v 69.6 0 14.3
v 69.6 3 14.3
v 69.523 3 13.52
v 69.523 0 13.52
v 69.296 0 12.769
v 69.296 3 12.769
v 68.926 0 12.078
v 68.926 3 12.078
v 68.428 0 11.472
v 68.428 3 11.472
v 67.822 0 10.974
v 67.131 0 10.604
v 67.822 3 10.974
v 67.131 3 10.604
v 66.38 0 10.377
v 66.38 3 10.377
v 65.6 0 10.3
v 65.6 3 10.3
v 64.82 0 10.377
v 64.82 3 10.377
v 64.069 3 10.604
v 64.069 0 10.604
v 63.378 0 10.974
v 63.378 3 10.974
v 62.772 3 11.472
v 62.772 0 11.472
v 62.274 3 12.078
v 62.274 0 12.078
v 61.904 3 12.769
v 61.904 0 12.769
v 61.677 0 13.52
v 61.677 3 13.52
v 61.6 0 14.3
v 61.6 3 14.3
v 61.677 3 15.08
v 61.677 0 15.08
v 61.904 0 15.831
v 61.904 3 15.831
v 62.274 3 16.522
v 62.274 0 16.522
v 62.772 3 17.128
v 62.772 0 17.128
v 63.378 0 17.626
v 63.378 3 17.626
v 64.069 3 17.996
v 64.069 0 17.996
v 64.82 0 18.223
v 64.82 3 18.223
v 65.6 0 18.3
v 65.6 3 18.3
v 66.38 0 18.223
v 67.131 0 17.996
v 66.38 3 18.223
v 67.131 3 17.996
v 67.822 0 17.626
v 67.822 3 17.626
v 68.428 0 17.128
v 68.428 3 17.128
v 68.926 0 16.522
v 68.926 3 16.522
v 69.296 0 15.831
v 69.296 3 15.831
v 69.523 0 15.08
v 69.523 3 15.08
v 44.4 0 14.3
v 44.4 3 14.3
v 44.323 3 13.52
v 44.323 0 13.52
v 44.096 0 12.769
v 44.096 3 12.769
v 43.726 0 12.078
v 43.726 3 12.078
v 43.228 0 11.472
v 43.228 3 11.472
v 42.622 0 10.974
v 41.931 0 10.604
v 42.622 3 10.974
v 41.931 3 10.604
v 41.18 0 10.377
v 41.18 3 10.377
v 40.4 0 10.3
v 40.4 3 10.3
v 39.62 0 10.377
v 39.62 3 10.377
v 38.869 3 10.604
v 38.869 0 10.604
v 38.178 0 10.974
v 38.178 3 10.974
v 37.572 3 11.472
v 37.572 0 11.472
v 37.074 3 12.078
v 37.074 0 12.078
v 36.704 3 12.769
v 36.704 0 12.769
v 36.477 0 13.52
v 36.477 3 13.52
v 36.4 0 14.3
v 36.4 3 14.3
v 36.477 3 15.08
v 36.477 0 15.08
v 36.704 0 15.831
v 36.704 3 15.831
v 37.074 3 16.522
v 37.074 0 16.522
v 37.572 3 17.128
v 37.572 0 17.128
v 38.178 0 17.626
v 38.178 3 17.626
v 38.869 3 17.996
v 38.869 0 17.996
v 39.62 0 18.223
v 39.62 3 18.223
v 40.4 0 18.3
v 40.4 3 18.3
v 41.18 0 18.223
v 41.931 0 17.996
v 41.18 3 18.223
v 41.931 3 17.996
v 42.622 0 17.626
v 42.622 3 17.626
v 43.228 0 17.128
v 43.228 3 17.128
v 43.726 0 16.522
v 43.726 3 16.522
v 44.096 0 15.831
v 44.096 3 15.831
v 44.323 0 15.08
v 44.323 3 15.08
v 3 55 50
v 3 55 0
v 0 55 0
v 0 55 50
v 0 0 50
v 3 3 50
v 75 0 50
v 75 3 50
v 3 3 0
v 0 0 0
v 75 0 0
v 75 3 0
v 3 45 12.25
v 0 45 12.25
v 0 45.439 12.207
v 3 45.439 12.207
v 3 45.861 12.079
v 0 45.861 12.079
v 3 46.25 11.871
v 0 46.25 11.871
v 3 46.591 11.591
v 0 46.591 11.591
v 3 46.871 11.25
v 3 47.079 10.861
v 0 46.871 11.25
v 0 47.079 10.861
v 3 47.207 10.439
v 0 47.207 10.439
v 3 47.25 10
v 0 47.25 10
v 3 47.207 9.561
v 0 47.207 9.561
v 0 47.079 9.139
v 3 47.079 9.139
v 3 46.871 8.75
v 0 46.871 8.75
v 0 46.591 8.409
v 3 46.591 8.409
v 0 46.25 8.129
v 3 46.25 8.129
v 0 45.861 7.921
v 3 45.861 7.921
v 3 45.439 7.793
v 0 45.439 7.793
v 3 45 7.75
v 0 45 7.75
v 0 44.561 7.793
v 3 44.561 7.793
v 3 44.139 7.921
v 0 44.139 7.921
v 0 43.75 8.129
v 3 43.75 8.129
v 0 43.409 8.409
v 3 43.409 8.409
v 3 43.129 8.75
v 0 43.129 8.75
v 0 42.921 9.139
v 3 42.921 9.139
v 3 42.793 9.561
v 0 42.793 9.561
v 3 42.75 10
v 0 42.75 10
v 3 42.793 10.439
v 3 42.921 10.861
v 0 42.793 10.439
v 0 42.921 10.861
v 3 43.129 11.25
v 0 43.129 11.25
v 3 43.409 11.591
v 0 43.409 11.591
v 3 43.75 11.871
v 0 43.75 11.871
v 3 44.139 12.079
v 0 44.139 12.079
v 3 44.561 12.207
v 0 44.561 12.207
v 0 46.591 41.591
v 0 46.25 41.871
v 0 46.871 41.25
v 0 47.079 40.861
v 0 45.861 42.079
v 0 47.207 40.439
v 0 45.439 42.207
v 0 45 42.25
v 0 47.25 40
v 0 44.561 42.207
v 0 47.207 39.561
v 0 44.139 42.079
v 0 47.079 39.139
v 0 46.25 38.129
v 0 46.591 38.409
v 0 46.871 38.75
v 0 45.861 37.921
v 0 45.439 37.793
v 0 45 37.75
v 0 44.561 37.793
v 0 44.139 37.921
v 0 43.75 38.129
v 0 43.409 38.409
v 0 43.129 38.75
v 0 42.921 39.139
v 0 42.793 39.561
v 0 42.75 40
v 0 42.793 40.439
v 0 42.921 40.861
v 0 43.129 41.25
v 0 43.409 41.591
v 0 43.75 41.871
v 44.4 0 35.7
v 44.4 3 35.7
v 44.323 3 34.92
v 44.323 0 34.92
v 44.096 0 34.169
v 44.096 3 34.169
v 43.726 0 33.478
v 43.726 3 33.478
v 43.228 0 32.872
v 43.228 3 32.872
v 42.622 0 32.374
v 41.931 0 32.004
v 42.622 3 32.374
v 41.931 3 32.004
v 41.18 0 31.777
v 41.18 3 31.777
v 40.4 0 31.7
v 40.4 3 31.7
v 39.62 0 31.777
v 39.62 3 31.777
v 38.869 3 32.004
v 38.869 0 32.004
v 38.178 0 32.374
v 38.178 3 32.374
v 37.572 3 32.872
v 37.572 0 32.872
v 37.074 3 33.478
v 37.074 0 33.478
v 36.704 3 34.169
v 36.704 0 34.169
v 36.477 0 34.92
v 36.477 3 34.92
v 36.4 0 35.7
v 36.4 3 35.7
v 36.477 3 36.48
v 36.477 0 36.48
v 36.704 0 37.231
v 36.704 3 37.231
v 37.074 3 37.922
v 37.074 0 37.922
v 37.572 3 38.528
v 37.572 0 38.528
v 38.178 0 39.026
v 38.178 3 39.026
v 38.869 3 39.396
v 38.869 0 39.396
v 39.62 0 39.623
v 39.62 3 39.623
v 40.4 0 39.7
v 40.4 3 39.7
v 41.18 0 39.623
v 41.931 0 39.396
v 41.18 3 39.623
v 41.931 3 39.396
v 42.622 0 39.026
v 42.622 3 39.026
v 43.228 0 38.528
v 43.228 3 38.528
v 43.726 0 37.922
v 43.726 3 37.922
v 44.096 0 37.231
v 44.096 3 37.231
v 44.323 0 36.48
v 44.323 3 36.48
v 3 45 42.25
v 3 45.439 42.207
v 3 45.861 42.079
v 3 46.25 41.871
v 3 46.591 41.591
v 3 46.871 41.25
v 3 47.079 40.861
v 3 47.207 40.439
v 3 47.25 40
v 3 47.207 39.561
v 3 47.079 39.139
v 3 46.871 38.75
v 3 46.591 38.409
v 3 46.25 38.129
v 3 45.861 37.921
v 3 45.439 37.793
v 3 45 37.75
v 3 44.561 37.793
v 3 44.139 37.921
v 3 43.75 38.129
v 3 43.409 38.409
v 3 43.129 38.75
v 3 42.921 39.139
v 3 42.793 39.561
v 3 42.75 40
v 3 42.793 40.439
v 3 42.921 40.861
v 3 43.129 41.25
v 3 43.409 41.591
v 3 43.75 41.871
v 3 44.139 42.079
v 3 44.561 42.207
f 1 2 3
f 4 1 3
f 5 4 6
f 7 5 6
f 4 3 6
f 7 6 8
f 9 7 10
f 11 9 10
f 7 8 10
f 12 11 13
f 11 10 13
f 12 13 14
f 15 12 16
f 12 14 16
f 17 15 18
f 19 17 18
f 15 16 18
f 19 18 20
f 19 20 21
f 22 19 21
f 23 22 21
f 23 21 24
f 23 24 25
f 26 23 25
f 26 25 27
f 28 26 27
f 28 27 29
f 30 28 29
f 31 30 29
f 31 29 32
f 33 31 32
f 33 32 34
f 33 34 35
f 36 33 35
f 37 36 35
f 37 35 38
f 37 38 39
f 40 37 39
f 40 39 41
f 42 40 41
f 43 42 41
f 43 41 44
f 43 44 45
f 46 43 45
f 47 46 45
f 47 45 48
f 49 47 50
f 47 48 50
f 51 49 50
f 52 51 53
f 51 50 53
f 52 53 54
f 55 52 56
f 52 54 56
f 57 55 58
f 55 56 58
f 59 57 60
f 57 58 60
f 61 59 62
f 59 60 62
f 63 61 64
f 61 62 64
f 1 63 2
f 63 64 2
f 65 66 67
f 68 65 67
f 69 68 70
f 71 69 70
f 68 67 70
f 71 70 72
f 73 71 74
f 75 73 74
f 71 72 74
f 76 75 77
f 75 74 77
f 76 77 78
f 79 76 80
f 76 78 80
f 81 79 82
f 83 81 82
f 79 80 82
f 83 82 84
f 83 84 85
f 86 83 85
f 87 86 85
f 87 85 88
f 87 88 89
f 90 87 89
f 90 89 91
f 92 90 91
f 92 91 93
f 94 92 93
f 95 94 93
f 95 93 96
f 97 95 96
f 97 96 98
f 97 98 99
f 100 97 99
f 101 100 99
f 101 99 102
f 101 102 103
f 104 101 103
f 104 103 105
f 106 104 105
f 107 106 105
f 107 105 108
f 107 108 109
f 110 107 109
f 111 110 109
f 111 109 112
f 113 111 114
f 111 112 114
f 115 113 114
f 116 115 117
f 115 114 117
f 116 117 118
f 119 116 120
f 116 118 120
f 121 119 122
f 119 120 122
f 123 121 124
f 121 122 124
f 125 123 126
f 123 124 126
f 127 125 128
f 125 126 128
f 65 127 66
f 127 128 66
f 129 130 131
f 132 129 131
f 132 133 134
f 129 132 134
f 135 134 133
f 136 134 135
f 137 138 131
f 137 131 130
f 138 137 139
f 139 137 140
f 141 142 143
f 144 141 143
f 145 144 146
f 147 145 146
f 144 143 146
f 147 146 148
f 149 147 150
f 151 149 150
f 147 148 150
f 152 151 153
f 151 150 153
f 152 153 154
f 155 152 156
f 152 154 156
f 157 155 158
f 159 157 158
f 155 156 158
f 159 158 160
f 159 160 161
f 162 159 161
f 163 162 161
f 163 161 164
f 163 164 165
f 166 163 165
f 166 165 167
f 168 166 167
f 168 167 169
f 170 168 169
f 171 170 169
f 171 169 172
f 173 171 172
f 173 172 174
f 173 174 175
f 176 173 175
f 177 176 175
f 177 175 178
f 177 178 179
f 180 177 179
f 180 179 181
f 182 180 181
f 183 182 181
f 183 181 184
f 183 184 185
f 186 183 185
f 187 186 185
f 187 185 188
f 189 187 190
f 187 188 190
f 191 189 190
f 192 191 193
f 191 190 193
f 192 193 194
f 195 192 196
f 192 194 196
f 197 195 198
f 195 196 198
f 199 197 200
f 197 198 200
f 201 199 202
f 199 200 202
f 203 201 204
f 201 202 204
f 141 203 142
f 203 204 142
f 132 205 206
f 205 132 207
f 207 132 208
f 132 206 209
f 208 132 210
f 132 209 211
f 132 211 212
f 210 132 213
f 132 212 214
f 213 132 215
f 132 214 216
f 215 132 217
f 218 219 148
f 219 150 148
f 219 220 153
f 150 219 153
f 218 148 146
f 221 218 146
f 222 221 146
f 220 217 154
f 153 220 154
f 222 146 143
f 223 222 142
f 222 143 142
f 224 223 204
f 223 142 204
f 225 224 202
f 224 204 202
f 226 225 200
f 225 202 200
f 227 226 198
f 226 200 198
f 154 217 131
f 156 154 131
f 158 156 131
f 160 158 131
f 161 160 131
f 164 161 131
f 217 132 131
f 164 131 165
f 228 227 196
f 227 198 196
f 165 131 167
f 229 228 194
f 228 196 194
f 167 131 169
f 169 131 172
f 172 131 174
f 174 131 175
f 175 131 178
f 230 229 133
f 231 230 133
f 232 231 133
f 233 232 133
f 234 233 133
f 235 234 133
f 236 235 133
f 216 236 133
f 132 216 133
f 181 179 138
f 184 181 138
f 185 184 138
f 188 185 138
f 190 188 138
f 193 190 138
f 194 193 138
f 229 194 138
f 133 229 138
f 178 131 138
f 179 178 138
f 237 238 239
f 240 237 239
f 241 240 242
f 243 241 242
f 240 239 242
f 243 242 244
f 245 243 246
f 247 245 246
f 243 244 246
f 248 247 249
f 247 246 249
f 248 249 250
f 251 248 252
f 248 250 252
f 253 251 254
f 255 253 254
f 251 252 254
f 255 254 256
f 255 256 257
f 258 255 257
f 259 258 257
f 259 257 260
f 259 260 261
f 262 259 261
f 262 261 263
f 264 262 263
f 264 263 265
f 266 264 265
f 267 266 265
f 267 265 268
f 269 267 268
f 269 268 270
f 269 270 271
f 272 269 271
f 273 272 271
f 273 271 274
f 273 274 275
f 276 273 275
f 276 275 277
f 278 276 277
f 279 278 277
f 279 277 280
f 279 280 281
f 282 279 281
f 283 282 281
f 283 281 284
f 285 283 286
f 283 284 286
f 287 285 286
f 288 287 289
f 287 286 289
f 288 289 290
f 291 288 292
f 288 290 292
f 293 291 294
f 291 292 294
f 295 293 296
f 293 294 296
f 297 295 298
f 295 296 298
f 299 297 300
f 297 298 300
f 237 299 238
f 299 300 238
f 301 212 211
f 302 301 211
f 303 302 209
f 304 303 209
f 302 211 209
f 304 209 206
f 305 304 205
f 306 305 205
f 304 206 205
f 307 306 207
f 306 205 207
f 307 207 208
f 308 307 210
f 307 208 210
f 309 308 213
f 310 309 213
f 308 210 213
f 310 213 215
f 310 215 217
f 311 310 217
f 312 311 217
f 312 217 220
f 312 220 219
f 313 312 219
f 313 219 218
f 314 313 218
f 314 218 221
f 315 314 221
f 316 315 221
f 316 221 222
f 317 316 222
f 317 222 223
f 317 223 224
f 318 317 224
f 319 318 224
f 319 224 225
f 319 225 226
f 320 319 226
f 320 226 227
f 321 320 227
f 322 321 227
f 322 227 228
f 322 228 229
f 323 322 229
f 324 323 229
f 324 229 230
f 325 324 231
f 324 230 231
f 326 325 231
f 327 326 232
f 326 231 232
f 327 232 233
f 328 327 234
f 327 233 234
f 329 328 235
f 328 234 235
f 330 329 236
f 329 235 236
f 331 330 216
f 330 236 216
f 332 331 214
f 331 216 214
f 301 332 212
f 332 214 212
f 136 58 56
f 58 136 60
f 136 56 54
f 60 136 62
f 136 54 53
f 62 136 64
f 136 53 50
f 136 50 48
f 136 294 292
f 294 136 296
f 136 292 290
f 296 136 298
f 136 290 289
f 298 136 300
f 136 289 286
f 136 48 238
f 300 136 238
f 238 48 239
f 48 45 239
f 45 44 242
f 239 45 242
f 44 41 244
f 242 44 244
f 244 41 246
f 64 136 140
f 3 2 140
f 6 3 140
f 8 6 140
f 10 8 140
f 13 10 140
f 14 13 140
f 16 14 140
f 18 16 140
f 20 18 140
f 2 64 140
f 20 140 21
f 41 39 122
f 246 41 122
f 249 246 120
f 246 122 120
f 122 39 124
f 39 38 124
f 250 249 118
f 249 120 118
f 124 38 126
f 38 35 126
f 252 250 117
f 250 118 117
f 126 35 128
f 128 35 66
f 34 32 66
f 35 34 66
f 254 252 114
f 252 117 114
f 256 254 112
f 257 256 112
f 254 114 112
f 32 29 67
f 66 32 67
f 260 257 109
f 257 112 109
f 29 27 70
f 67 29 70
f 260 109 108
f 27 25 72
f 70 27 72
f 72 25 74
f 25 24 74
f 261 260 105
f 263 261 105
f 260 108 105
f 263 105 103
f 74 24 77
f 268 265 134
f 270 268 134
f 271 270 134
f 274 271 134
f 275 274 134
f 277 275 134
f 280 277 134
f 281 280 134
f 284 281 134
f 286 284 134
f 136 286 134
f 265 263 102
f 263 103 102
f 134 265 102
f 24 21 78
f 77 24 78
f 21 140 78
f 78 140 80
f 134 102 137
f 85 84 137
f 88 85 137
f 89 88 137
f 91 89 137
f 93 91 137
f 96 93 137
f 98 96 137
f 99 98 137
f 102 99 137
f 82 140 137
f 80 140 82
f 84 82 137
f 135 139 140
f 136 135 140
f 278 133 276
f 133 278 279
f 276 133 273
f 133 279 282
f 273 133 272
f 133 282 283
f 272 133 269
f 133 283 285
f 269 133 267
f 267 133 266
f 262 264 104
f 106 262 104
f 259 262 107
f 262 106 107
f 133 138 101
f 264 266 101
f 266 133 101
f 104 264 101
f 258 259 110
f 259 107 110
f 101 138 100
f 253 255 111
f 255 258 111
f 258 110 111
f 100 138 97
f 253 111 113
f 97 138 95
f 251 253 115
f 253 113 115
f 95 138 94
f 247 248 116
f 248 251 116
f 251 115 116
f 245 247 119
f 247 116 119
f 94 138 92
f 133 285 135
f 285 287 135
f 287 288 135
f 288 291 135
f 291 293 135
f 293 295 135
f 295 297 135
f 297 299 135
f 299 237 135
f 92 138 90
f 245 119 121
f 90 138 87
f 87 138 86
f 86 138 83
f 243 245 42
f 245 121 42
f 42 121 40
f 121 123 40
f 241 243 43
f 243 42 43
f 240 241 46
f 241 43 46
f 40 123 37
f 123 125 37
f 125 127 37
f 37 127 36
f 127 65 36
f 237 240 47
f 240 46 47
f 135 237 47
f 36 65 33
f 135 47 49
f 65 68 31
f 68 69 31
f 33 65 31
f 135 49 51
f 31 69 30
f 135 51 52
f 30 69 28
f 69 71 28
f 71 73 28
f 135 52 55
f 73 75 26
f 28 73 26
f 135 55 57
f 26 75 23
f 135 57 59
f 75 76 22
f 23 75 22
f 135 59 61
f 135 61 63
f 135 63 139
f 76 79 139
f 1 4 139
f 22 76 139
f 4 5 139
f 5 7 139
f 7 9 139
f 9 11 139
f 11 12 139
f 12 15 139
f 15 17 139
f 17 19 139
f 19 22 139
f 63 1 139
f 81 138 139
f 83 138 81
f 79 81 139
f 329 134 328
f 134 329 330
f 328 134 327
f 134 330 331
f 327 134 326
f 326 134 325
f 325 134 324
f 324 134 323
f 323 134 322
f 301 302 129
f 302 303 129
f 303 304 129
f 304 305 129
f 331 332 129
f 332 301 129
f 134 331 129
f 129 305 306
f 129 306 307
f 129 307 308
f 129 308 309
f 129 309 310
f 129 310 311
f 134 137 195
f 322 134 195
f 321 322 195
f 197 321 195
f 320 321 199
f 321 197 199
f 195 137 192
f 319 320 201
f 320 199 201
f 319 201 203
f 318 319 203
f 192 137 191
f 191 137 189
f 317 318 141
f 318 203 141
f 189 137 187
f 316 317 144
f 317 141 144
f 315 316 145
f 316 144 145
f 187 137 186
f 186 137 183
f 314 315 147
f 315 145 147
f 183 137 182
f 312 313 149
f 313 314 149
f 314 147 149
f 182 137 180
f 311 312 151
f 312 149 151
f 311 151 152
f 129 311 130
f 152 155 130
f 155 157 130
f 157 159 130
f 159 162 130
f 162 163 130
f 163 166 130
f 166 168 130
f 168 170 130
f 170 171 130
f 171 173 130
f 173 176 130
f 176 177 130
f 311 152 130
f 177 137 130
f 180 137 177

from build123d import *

# Parameters (mm, degrees)
EXTRUDE_1_DEPTH     = 50
SKETCH_6_R          = 2
CUT_EXTRUDE_2_DEPTH = 4
SKETCH1_R           = 2
CUT_EXTRUDE1_DEPTH  = 4
SKETCH2_R           = 4
CUT_EXTRUDE2_DEPTH  = 4
SKETCH4_R           = 2.25
CUT_EXTRUDE3_DEPTH  = 76


with BuildPart() as part:
    # Эскиз1 → Бобышка-Вытянуть1 (new body)
    with BuildSketch(Plane.XY):
        Polygon((0, 0), (75, 0), (75, 3), (3, 3), (3, 55), (0, 55), align=None)
    extrude(amount=EXTRUDE_1_DEPTH)

    # Эскиз6 → Вырез-Вытянуть2 (cut, through all)
    with BuildSketch(Plane(origin=(0, 3, 0), x_dir=(1, 0, 0), z_dir=(0, 1, 0))):
        with Locations((40.4, -14.3)):
            Circle(SKETCH_6_R)
        with Locations((40.4, -35.7)):
            Circle(SKETCH_6_R)
    extrude(amount=-CUT_EXTRUDE_2_DEPTH, mode=Mode.SUBTRACT)

    # Sketch1 → Cut-Extrude1 (cut, through all)
    with BuildSketch(Plane(origin=(0, 3, 0), x_dir=(1, 0, 0), z_dir=(0, 1, 0))):
        with Locations((65.6, -14.3)):
            Circle(SKETCH1_R)
    extrude(amount=-CUT_EXTRUDE1_DEPTH, mode=Mode.SUBTRACT)

    # Sketch2 → Cut-Extrude2 (cut, through all)
    with BuildSketch(Plane(origin=(0, 3, 0), x_dir=(1, 0, 0), z_dir=(0, 1, 0))):
        with Locations((40.4, -14.3)):
            Circle(SKETCH2_R)
        with Locations((65.6, -14.3)):
            Circle(SKETCH2_R)
        with Locations((40.4, -35.7)):
            Circle(SKETCH2_R)
    extrude(amount=-CUT_EXTRUDE2_DEPTH, mode=Mode.SUBTRACT)

    # Sketch4 → Cut-Extrude3 (cut, through all)
    with BuildSketch(Plane.ZY):
        with Locations((10, 45)):
            Circle(SKETCH4_R)
        with Locations((40, 45)):
            Circle(SKETCH4_R)
    extrude(amount=-CUT_EXTRUDE3_DEPTH, mode=Mode.SUBTRACT)


solid = part.part
